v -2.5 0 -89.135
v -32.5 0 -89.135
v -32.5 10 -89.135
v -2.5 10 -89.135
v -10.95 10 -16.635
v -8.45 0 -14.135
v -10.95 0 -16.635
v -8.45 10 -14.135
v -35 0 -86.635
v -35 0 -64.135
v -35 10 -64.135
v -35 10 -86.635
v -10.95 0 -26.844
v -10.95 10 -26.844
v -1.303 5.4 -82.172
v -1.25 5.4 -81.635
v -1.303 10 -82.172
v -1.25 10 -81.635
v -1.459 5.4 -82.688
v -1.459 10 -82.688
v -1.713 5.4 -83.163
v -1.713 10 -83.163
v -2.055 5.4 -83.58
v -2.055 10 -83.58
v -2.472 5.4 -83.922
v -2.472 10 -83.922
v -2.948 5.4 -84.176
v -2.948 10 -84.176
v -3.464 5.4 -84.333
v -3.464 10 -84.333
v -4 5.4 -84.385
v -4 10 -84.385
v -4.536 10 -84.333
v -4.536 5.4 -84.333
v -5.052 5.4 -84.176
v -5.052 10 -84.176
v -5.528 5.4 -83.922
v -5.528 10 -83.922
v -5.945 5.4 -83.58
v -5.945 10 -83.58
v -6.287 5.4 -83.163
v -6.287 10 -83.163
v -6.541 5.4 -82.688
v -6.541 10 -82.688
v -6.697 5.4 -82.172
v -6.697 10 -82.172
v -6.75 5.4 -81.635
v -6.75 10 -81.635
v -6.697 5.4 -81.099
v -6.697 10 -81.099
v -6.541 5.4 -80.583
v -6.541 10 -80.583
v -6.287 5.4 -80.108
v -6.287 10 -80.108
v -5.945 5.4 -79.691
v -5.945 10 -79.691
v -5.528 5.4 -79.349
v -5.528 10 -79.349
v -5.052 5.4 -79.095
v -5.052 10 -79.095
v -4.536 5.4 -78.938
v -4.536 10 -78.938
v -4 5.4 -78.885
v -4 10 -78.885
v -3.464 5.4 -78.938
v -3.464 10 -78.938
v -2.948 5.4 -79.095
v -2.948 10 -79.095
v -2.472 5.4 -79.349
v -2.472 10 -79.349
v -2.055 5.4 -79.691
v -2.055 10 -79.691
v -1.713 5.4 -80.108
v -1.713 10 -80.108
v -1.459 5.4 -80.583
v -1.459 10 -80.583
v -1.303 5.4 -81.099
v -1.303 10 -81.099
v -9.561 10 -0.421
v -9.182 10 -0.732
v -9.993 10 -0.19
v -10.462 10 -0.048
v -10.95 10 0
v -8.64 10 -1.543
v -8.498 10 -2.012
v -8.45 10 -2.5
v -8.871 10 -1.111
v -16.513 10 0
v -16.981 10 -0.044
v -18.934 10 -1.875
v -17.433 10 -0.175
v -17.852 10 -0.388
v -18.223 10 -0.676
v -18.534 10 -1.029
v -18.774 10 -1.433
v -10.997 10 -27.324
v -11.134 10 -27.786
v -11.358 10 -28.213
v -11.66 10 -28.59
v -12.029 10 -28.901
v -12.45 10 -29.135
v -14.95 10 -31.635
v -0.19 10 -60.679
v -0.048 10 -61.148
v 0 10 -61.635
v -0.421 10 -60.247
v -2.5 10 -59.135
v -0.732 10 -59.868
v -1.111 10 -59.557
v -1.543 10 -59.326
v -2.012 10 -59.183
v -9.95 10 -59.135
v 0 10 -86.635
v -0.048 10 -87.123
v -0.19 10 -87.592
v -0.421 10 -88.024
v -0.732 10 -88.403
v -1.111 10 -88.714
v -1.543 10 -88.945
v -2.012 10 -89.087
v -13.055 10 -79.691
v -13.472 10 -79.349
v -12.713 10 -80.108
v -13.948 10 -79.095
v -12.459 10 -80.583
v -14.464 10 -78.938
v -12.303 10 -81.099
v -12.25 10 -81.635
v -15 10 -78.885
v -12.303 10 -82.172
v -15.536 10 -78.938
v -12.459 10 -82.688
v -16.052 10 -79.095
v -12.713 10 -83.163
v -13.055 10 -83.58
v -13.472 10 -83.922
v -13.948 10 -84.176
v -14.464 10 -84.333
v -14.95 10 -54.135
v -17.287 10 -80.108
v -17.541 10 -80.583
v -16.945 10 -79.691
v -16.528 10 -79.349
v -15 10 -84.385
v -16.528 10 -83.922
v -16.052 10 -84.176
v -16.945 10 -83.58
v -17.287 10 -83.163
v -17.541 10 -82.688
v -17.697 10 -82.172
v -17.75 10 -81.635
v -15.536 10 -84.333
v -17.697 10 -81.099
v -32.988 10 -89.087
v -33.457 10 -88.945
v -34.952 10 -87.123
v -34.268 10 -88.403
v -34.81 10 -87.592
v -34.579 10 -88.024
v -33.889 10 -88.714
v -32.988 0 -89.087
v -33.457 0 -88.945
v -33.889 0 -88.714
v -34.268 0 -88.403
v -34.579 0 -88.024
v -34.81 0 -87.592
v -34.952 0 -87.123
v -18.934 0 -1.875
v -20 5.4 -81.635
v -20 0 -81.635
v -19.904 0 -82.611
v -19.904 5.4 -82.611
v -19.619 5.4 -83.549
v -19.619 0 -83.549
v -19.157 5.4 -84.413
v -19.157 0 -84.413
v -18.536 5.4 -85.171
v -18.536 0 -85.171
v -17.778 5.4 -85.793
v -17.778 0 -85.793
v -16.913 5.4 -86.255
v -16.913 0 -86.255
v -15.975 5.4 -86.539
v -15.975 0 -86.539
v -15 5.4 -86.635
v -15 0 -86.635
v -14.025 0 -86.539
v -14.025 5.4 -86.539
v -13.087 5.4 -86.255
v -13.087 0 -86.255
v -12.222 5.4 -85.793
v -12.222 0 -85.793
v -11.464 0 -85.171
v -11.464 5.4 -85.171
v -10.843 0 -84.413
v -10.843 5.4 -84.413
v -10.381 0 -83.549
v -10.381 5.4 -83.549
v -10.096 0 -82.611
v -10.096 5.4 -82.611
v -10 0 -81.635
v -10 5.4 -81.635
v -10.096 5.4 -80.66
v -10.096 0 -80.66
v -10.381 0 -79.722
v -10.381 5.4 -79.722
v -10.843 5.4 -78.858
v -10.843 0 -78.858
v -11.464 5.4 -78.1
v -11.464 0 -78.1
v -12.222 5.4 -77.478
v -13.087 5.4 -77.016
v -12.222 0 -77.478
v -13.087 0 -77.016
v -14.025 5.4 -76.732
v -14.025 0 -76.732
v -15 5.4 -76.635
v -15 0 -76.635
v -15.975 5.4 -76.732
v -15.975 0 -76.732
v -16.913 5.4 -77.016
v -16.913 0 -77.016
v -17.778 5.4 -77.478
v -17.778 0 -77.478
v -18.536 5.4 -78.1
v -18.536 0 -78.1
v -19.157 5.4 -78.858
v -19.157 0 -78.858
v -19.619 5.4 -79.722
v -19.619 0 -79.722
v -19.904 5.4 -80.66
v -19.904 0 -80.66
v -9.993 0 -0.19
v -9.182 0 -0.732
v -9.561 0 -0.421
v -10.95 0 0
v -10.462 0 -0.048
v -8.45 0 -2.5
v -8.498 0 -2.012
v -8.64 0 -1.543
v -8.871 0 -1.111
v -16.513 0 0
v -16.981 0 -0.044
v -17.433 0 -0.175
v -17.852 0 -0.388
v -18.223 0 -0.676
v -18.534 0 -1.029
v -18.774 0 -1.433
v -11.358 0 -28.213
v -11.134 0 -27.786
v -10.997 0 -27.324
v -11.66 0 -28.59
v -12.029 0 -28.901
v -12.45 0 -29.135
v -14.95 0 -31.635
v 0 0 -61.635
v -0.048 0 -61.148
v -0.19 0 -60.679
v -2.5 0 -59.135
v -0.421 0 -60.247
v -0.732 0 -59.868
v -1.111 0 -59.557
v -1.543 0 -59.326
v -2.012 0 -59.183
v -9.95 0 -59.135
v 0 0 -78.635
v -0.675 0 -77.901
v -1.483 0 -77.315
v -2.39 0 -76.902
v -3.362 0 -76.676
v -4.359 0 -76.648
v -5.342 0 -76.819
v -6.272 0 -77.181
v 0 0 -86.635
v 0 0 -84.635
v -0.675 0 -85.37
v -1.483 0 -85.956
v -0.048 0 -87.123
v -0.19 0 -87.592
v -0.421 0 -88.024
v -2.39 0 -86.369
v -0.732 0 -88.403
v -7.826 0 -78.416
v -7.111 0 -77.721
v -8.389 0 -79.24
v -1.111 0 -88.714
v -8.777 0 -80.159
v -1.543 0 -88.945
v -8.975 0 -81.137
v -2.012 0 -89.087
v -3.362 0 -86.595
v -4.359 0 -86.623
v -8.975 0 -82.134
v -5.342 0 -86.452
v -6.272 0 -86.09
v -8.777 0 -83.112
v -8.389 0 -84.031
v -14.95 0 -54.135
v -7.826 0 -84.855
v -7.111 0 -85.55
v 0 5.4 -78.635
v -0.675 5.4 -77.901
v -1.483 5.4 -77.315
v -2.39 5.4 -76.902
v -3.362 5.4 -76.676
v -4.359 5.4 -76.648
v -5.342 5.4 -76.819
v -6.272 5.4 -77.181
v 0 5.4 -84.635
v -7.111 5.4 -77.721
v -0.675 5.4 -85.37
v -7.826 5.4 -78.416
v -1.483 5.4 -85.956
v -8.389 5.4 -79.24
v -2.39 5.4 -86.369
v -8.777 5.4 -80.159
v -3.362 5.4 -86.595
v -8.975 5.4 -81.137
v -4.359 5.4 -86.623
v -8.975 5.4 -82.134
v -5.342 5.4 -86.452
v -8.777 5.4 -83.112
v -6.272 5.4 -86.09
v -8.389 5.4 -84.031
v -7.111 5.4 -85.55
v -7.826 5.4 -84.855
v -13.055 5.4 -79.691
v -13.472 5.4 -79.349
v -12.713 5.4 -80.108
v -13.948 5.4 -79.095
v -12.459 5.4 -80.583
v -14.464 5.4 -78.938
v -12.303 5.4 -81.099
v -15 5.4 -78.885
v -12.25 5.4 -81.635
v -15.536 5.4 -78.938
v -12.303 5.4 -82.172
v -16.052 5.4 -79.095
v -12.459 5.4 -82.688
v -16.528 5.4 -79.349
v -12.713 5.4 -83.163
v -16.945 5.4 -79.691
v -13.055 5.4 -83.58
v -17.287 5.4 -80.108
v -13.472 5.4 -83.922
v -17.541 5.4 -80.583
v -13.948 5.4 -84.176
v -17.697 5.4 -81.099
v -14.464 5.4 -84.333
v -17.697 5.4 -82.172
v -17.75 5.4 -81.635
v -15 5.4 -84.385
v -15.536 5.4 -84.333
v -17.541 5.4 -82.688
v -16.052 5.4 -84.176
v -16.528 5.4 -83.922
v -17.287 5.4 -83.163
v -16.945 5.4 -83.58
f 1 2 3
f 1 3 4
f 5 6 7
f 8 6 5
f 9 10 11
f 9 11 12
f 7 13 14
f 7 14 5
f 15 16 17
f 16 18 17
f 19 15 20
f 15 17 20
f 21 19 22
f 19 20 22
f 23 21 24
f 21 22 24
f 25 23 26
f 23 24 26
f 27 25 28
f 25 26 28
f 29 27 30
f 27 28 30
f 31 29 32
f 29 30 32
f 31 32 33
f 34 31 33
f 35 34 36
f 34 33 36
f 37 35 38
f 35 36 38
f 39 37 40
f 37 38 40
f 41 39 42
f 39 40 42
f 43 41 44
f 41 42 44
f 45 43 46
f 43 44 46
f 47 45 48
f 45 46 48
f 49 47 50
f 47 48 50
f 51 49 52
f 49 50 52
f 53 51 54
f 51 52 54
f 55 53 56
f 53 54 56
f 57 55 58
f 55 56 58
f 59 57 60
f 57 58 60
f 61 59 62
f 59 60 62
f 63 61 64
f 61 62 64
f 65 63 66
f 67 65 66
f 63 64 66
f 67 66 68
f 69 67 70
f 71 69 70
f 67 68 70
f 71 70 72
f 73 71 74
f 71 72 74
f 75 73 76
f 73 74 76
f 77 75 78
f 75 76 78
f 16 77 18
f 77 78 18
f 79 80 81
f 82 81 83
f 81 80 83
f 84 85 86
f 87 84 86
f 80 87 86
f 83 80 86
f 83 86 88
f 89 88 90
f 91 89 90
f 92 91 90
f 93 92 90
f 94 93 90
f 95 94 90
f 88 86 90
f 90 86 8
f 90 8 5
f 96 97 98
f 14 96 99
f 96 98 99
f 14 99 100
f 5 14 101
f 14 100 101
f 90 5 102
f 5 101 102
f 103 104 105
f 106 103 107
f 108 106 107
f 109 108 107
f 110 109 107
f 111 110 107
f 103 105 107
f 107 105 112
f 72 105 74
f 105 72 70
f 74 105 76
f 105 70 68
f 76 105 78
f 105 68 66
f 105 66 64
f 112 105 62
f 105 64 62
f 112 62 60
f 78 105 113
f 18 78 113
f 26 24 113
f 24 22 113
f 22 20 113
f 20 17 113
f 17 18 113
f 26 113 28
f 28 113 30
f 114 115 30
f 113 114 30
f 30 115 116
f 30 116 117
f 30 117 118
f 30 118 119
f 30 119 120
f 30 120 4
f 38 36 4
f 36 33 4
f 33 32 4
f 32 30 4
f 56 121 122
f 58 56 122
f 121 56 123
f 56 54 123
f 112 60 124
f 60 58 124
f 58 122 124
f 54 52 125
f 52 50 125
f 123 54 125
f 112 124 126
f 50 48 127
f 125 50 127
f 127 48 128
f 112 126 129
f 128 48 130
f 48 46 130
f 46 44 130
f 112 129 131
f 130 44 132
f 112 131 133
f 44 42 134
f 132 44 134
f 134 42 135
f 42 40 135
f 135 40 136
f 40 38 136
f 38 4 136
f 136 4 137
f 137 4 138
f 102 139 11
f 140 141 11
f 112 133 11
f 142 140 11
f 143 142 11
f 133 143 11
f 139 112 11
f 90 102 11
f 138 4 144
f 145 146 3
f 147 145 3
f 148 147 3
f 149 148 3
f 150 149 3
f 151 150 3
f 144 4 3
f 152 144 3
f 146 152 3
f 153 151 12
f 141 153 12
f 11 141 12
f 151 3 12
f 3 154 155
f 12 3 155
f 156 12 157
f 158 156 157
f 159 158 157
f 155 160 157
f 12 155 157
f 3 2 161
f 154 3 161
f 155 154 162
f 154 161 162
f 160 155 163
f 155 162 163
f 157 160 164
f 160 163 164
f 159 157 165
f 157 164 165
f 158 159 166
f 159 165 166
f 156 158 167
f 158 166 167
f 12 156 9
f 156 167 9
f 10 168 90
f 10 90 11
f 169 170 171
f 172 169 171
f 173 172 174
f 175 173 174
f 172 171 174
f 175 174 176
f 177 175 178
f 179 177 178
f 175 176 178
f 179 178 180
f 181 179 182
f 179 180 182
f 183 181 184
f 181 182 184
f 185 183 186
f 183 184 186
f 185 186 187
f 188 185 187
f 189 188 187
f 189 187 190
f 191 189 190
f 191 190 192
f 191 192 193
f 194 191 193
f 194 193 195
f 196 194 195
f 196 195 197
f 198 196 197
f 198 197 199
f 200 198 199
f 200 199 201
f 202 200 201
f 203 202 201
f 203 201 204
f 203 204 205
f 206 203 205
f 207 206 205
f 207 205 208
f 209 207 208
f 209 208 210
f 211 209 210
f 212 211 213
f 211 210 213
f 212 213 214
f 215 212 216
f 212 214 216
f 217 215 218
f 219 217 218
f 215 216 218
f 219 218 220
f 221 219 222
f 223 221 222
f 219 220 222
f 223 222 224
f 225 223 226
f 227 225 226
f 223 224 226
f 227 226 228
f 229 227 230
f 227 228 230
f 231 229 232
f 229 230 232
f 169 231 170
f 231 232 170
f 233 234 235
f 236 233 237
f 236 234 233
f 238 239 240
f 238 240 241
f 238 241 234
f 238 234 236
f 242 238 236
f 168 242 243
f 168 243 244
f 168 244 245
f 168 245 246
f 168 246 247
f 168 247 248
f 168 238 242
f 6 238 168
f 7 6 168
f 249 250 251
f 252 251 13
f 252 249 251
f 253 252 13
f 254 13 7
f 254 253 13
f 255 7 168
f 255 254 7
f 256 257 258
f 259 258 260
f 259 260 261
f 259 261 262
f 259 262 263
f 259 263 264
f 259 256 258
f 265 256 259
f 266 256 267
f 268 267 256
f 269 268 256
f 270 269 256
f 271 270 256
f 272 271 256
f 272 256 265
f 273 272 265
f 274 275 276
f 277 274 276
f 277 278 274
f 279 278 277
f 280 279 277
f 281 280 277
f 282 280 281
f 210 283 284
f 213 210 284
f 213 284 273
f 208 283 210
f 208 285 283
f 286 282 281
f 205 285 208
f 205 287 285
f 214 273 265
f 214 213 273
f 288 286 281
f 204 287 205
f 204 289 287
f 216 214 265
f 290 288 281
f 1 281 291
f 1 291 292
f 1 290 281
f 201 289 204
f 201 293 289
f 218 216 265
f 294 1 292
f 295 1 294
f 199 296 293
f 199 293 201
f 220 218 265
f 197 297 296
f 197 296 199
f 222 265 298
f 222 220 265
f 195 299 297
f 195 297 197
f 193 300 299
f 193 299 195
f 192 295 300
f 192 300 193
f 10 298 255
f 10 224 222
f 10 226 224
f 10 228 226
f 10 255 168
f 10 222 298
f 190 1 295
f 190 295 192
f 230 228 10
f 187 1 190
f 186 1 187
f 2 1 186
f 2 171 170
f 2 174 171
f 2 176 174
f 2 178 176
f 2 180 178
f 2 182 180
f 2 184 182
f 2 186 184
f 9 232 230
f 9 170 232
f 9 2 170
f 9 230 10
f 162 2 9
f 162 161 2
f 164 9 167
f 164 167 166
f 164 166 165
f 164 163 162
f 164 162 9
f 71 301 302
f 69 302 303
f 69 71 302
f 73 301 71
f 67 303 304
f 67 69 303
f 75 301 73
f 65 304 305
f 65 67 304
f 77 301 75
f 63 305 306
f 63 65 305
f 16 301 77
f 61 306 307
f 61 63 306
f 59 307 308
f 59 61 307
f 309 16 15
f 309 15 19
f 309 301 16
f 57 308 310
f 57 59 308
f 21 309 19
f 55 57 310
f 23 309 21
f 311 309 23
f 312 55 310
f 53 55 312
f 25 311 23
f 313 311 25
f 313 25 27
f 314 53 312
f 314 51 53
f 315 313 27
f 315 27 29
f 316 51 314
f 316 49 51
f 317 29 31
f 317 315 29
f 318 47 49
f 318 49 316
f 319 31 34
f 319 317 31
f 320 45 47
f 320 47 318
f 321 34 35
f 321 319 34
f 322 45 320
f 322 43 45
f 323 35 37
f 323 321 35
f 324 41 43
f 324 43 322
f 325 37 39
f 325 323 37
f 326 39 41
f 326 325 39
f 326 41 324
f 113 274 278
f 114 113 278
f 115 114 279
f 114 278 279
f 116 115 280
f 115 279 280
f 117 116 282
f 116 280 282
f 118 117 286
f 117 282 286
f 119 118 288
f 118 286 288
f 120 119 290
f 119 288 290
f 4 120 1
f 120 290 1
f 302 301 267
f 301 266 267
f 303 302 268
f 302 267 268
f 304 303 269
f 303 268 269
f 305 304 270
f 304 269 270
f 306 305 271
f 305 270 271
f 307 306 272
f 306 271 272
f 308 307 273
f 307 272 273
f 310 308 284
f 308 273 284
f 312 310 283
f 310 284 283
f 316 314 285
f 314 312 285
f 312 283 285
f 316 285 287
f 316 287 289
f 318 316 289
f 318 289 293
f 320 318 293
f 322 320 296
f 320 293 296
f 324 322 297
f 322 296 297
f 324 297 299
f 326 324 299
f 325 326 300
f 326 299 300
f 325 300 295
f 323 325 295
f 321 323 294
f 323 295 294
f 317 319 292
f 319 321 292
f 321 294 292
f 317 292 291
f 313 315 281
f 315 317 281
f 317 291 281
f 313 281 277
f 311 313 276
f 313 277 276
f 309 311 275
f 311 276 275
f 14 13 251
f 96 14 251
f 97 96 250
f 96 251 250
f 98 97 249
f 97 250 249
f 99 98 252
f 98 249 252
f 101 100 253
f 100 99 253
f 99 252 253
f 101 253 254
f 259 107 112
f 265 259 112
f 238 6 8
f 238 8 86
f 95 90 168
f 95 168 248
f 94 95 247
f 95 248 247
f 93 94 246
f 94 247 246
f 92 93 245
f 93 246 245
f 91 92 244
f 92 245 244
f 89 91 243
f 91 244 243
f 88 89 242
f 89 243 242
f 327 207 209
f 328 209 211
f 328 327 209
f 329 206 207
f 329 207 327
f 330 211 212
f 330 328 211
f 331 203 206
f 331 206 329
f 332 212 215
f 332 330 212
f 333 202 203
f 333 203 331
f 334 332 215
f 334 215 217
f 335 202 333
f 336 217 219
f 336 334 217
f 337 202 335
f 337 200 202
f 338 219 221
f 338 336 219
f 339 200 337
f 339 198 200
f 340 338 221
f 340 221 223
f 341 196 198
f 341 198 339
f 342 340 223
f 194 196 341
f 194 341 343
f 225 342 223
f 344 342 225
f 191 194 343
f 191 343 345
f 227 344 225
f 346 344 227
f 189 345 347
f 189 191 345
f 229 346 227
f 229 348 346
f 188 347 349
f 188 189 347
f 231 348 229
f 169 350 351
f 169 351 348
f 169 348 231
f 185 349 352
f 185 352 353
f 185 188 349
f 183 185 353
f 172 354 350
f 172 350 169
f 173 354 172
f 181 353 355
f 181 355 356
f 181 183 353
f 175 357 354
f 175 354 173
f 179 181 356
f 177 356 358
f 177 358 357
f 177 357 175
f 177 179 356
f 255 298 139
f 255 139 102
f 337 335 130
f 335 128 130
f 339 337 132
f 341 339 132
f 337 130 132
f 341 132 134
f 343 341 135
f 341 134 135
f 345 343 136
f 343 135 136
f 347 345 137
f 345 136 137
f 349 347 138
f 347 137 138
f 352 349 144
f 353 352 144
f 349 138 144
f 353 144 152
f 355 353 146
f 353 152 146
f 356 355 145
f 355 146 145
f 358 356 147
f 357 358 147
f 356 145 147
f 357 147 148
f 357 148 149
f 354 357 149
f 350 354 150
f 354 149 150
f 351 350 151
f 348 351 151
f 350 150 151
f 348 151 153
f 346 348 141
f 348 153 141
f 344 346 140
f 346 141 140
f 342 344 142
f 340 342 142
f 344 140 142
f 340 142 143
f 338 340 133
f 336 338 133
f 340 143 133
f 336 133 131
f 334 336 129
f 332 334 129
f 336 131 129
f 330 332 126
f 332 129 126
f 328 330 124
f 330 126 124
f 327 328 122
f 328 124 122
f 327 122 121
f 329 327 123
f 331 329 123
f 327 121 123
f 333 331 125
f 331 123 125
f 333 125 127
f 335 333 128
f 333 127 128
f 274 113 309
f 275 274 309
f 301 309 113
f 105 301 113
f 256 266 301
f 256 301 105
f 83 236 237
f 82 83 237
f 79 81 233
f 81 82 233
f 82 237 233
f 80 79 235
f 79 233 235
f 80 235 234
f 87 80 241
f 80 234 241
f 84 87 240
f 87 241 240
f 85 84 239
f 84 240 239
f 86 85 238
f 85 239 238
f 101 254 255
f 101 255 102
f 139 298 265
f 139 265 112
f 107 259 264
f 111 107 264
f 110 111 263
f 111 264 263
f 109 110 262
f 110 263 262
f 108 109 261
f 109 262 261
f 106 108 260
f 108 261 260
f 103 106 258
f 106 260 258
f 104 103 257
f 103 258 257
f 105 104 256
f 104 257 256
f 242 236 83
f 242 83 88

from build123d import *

# Parameters (mm, degrees)
BOSS_EXTRUDE1_DEPTH                                 = 10
CHAMFER1_SIZE                                       = 5
CHAMFER2_SIZE                                       = 2.5
FILLET1_R                                           = 2.5
CBORE_FOR_M5_HEX_SOCKET_HEAD_CAP_SCREW5_D           = 5.5
CBORE_FOR_M5_HEX_SOCKET_HEAD_CAP_SCREW5_DEPTH       = 10
CBORE_FOR_M5_HEX_SOCKET_HEAD_CAP_SCREW5_CBORE_D     = 10
CBORE_FOR_M5_HEX_SOCKET_HEAD_CAP_SCREW5_CBORE_DEPTH = 5.4
CBORE_FOR_M5_HEX_SOCKET_HEAD_CAP_SCREW5_TIP         = 1.652366702


# Some blends are built 0.0001 mm under size
with BuildPart() as part:
    # Sketch2 → Boss-Extrude1 (new body)
    with BuildSketch(Plane(origin=(0, 0, 0), x_dir=(1, 0, 0), z_dir=(0, 1, 0))):
        Polygon((0, 59.135462652), (-14.95, 59.135462652), (-14.95, 29.135462652), (-10.95, 29.135462652), (-10.95, 14.135462652), (-8.45, 14.135462652), (-8.45, 0), (-18.45, 0), (-35, 64.135462652), (-35, 89.135462652), (0, 89.135462652), align=None)
    extrude(amount=BOSS_EXTRUDE1_DEPTH)

    # Chamfer1
    chamfer1_edges = [part.edges().sort_by_distance(p)[0] for p in [
        (-14.95, 5, -59.135462652),
    ]]
    chamfer(chamfer1_edges, length=CHAMFER1_SIZE)

    # Chamfer2
    chamfer2_edges = [part.edges().sort_by_distance(p)[0] for p in [
        (-10.95, 5, -14.135462652),
        (-14.95, 5, -29.135462652),
    ]]
    chamfer(chamfer2_edges, length=CHAMFER2_SIZE - 0.0001)  # a hair under: the kernel refuses the full size

    # Fillet1
    # the kernel refuses this fillet: 2.5 mm, written as the material it takes off along each edge
    with BuildSketch(Plane(origin=(0, -6.25, -89.135462652), x_dir=(0, 0, 1), z_dir=(0, 1, 0)), Plane(origin=(-35, -6.25, -89.135462652), x_dir=(1, 0, 0), z_dir=(0, 1, 0)), Plane(origin=(0, -6.25, -59.135462652), x_dir=(-1, 0, 0), z_dir=(0, 1, 0))) as fillet1_piece_1:
        with BuildLine():
            CenterArc((FILLET1_R, -FILLET1_R), FILLET1_R, 90, 90)
            Line((0, -FILLET1_R), (-FILLET1_R * 0.02, -FILLET1_R))
            Line((-FILLET1_R * 0.02, -FILLET1_R), (-FILLET1_R * 0.02, FILLET1_R * 0.02))
            Line((-FILLET1_R * 0.02, FILLET1_R * 0.02), (FILLET1_R, FILLET1_R * 0.02))
            Line((FILLET1_R, FILLET1_R * 0.02), (FILLET1_R, 0))
        make_face()
    extrude(amount=22.5, mode=Mode.SUBTRACT)
    with BuildSketch(Plane(origin=(-8.45, -6.25, 0), x_dir=(0, 0, -1), z_dir=(0, 1, 0))) as fillet1_piece_2:
        with BuildLine():
            CenterArc((FILLET1_R, FILLET1_R), FILLET1_R, 180, 90)
            Line((0, FILLET1_R), (-FILLET1_R * 0.02, FILLET1_R))
            Line((-FILLET1_R * 0.02, FILLET1_R), (-FILLET1_R * 0.02, -FILLET1_R * 0.02))
            Line((-FILLET1_R * 0.02, -FILLET1_R * 0.02), (FILLET1_R, -FILLET1_R * 0.02))
            Line((FILLET1_R, -FILLET1_R * 0.02), (FILLET1_R, 0))
        make_face()
    extrude(amount=22.5, mode=Mode.SUBTRACT)
    with BuildSketch(Plane(origin=(-18.45, -4.84193858, 0), x_dir=(-0.24986263082994187, 0, -0.9682812947252158), z_dir=(0, 1, 0))) as fillet1_piece_3:
        with BuildLine():
            CenterArc((FILLET1_R * 0.774710172815, -FILLET1_R), FILLET1_R, 90, 75.530616462)
            Line((-FILLET1_R * 0.19357112191, -FILLET1_R * 0.75013736917), (-FILLET1_R * 0.212936747805, -FILLET1_R * 0.745140116553))
            Line((-FILLET1_R * 0.212936747805, -FILLET1_R * 0.745140116553), (-FILLET1_R * 0.0154942034563, FILLET1_R * 0.02))
            Line((-FILLET1_R * 0.0154942034563, FILLET1_R * 0.02), (FILLET1_R * 0.774710172815, FILLET1_R * 0.02))
            Line((FILLET1_R * 0.774710172815, FILLET1_R * 0.02), (FILLET1_R * 0.774710172815, 0))
        make_face()
    extrude(amount=19.68387716, mode=Mode.SUBTRACT)
    with BuildSketch(Plane(origin=(-10.95, -5.728328721, -29.135462652), x_dir=(-1, 0, 0), z_dir=(0, 1, 0))) as fillet1_piece_4:
        with BuildLine():
            CenterArc((2.5, 2.291331488), FILLET1_R, 180, 66.424322091)
            Line((0, 2.291331488), (-0.05, 2.291331488))
            Line((-0.05, 2.291331488), (-0.05, 0))
            Line((-0.05, 0), (0, -0.05))
            ThreePointArc((0, -0.05), (0.75005, -0.05), (1.480102, -0.04582663))
            Line((1.480102, -0.04582663), (1.5001, 0))
        make_face()
    extrude(amount=21.456657442, mode=Mode.SUBTRACT)

    # CBORE for M5 Hex Socket Head Cap Screw5
    with Locations(Plane(origin=(0, 0, 0), x_dir=(-1, 0, 0), z_dir=(0, -1, 0))):
        with Locations((4, 81.635462652), (15, 81.635462652)):
            CounterBoreHole(CBORE_FOR_M5_HEX_SOCKET_HEAD_CAP_SCREW5_D / 2, CBORE_FOR_M5_HEX_SOCKET_HEAD_CAP_SCREW5_CBORE_D / 2, CBORE_FOR_M5_HEX_SOCKET_HEAD_CAP_SCREW5_CBORE_DEPTH, depth=CBORE_FOR_M5_HEX_SOCKET_HEAD_CAP_SCREW5_DEPTH)
            with Locations((0, 0, -(CBORE_FOR_M5_HEX_SOCKET_HEAD_CAP_SCREW5_DEPTH + CBORE_FOR_M5_HEX_SOCKET_HEAD_CAP_SCREW5_TIP / 2))):  # 118° drill point
                Cone(0, CBORE_FOR_M5_HEX_SOCKET_HEAD_CAP_SCREW5_D / 2, CBORE_FOR_M5_HEX_SOCKET_HEAD_CAP_SCREW5_TIP, mode=Mode.SUBTRACT)


solid = part.part
